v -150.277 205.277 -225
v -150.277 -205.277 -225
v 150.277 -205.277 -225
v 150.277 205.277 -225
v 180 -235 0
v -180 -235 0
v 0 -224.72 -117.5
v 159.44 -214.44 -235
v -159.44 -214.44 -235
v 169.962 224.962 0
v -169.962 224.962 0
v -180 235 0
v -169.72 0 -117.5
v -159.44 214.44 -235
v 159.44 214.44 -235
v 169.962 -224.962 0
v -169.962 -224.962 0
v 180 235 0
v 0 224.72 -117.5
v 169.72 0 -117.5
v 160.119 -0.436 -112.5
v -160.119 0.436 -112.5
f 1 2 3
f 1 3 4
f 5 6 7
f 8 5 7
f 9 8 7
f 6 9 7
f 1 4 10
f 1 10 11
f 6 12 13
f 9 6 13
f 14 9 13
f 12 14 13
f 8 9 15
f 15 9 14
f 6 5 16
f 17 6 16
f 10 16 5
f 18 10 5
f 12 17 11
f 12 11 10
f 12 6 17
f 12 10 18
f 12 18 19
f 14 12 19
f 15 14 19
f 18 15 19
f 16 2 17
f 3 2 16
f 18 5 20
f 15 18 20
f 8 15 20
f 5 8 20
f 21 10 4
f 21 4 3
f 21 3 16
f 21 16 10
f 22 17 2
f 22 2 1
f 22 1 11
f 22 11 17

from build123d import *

# Parameters (mm, degrees)
F0_W     = 360
F0_H     = 470
F1_DEPTH = 235
F1_TAPER = 5
F2_T     = -10


with BuildPart() as f1:
    # F0 (on Top) → F1 (new body)
    with BuildSketch(Plane.XY):
        Rectangle(F0_W, F0_H)
    extrude(amount=-F1_DEPTH, taper=F1_TAPER)

    # F2
    f2_openings = [f1.faces().sort_by_distance(p)[0] for p in [
        (0, 0, 0),
    ]]
    offset(amount=F2_T, openings=f2_openings, kind=Kind.INTERSECTION)


solid = f1.part
